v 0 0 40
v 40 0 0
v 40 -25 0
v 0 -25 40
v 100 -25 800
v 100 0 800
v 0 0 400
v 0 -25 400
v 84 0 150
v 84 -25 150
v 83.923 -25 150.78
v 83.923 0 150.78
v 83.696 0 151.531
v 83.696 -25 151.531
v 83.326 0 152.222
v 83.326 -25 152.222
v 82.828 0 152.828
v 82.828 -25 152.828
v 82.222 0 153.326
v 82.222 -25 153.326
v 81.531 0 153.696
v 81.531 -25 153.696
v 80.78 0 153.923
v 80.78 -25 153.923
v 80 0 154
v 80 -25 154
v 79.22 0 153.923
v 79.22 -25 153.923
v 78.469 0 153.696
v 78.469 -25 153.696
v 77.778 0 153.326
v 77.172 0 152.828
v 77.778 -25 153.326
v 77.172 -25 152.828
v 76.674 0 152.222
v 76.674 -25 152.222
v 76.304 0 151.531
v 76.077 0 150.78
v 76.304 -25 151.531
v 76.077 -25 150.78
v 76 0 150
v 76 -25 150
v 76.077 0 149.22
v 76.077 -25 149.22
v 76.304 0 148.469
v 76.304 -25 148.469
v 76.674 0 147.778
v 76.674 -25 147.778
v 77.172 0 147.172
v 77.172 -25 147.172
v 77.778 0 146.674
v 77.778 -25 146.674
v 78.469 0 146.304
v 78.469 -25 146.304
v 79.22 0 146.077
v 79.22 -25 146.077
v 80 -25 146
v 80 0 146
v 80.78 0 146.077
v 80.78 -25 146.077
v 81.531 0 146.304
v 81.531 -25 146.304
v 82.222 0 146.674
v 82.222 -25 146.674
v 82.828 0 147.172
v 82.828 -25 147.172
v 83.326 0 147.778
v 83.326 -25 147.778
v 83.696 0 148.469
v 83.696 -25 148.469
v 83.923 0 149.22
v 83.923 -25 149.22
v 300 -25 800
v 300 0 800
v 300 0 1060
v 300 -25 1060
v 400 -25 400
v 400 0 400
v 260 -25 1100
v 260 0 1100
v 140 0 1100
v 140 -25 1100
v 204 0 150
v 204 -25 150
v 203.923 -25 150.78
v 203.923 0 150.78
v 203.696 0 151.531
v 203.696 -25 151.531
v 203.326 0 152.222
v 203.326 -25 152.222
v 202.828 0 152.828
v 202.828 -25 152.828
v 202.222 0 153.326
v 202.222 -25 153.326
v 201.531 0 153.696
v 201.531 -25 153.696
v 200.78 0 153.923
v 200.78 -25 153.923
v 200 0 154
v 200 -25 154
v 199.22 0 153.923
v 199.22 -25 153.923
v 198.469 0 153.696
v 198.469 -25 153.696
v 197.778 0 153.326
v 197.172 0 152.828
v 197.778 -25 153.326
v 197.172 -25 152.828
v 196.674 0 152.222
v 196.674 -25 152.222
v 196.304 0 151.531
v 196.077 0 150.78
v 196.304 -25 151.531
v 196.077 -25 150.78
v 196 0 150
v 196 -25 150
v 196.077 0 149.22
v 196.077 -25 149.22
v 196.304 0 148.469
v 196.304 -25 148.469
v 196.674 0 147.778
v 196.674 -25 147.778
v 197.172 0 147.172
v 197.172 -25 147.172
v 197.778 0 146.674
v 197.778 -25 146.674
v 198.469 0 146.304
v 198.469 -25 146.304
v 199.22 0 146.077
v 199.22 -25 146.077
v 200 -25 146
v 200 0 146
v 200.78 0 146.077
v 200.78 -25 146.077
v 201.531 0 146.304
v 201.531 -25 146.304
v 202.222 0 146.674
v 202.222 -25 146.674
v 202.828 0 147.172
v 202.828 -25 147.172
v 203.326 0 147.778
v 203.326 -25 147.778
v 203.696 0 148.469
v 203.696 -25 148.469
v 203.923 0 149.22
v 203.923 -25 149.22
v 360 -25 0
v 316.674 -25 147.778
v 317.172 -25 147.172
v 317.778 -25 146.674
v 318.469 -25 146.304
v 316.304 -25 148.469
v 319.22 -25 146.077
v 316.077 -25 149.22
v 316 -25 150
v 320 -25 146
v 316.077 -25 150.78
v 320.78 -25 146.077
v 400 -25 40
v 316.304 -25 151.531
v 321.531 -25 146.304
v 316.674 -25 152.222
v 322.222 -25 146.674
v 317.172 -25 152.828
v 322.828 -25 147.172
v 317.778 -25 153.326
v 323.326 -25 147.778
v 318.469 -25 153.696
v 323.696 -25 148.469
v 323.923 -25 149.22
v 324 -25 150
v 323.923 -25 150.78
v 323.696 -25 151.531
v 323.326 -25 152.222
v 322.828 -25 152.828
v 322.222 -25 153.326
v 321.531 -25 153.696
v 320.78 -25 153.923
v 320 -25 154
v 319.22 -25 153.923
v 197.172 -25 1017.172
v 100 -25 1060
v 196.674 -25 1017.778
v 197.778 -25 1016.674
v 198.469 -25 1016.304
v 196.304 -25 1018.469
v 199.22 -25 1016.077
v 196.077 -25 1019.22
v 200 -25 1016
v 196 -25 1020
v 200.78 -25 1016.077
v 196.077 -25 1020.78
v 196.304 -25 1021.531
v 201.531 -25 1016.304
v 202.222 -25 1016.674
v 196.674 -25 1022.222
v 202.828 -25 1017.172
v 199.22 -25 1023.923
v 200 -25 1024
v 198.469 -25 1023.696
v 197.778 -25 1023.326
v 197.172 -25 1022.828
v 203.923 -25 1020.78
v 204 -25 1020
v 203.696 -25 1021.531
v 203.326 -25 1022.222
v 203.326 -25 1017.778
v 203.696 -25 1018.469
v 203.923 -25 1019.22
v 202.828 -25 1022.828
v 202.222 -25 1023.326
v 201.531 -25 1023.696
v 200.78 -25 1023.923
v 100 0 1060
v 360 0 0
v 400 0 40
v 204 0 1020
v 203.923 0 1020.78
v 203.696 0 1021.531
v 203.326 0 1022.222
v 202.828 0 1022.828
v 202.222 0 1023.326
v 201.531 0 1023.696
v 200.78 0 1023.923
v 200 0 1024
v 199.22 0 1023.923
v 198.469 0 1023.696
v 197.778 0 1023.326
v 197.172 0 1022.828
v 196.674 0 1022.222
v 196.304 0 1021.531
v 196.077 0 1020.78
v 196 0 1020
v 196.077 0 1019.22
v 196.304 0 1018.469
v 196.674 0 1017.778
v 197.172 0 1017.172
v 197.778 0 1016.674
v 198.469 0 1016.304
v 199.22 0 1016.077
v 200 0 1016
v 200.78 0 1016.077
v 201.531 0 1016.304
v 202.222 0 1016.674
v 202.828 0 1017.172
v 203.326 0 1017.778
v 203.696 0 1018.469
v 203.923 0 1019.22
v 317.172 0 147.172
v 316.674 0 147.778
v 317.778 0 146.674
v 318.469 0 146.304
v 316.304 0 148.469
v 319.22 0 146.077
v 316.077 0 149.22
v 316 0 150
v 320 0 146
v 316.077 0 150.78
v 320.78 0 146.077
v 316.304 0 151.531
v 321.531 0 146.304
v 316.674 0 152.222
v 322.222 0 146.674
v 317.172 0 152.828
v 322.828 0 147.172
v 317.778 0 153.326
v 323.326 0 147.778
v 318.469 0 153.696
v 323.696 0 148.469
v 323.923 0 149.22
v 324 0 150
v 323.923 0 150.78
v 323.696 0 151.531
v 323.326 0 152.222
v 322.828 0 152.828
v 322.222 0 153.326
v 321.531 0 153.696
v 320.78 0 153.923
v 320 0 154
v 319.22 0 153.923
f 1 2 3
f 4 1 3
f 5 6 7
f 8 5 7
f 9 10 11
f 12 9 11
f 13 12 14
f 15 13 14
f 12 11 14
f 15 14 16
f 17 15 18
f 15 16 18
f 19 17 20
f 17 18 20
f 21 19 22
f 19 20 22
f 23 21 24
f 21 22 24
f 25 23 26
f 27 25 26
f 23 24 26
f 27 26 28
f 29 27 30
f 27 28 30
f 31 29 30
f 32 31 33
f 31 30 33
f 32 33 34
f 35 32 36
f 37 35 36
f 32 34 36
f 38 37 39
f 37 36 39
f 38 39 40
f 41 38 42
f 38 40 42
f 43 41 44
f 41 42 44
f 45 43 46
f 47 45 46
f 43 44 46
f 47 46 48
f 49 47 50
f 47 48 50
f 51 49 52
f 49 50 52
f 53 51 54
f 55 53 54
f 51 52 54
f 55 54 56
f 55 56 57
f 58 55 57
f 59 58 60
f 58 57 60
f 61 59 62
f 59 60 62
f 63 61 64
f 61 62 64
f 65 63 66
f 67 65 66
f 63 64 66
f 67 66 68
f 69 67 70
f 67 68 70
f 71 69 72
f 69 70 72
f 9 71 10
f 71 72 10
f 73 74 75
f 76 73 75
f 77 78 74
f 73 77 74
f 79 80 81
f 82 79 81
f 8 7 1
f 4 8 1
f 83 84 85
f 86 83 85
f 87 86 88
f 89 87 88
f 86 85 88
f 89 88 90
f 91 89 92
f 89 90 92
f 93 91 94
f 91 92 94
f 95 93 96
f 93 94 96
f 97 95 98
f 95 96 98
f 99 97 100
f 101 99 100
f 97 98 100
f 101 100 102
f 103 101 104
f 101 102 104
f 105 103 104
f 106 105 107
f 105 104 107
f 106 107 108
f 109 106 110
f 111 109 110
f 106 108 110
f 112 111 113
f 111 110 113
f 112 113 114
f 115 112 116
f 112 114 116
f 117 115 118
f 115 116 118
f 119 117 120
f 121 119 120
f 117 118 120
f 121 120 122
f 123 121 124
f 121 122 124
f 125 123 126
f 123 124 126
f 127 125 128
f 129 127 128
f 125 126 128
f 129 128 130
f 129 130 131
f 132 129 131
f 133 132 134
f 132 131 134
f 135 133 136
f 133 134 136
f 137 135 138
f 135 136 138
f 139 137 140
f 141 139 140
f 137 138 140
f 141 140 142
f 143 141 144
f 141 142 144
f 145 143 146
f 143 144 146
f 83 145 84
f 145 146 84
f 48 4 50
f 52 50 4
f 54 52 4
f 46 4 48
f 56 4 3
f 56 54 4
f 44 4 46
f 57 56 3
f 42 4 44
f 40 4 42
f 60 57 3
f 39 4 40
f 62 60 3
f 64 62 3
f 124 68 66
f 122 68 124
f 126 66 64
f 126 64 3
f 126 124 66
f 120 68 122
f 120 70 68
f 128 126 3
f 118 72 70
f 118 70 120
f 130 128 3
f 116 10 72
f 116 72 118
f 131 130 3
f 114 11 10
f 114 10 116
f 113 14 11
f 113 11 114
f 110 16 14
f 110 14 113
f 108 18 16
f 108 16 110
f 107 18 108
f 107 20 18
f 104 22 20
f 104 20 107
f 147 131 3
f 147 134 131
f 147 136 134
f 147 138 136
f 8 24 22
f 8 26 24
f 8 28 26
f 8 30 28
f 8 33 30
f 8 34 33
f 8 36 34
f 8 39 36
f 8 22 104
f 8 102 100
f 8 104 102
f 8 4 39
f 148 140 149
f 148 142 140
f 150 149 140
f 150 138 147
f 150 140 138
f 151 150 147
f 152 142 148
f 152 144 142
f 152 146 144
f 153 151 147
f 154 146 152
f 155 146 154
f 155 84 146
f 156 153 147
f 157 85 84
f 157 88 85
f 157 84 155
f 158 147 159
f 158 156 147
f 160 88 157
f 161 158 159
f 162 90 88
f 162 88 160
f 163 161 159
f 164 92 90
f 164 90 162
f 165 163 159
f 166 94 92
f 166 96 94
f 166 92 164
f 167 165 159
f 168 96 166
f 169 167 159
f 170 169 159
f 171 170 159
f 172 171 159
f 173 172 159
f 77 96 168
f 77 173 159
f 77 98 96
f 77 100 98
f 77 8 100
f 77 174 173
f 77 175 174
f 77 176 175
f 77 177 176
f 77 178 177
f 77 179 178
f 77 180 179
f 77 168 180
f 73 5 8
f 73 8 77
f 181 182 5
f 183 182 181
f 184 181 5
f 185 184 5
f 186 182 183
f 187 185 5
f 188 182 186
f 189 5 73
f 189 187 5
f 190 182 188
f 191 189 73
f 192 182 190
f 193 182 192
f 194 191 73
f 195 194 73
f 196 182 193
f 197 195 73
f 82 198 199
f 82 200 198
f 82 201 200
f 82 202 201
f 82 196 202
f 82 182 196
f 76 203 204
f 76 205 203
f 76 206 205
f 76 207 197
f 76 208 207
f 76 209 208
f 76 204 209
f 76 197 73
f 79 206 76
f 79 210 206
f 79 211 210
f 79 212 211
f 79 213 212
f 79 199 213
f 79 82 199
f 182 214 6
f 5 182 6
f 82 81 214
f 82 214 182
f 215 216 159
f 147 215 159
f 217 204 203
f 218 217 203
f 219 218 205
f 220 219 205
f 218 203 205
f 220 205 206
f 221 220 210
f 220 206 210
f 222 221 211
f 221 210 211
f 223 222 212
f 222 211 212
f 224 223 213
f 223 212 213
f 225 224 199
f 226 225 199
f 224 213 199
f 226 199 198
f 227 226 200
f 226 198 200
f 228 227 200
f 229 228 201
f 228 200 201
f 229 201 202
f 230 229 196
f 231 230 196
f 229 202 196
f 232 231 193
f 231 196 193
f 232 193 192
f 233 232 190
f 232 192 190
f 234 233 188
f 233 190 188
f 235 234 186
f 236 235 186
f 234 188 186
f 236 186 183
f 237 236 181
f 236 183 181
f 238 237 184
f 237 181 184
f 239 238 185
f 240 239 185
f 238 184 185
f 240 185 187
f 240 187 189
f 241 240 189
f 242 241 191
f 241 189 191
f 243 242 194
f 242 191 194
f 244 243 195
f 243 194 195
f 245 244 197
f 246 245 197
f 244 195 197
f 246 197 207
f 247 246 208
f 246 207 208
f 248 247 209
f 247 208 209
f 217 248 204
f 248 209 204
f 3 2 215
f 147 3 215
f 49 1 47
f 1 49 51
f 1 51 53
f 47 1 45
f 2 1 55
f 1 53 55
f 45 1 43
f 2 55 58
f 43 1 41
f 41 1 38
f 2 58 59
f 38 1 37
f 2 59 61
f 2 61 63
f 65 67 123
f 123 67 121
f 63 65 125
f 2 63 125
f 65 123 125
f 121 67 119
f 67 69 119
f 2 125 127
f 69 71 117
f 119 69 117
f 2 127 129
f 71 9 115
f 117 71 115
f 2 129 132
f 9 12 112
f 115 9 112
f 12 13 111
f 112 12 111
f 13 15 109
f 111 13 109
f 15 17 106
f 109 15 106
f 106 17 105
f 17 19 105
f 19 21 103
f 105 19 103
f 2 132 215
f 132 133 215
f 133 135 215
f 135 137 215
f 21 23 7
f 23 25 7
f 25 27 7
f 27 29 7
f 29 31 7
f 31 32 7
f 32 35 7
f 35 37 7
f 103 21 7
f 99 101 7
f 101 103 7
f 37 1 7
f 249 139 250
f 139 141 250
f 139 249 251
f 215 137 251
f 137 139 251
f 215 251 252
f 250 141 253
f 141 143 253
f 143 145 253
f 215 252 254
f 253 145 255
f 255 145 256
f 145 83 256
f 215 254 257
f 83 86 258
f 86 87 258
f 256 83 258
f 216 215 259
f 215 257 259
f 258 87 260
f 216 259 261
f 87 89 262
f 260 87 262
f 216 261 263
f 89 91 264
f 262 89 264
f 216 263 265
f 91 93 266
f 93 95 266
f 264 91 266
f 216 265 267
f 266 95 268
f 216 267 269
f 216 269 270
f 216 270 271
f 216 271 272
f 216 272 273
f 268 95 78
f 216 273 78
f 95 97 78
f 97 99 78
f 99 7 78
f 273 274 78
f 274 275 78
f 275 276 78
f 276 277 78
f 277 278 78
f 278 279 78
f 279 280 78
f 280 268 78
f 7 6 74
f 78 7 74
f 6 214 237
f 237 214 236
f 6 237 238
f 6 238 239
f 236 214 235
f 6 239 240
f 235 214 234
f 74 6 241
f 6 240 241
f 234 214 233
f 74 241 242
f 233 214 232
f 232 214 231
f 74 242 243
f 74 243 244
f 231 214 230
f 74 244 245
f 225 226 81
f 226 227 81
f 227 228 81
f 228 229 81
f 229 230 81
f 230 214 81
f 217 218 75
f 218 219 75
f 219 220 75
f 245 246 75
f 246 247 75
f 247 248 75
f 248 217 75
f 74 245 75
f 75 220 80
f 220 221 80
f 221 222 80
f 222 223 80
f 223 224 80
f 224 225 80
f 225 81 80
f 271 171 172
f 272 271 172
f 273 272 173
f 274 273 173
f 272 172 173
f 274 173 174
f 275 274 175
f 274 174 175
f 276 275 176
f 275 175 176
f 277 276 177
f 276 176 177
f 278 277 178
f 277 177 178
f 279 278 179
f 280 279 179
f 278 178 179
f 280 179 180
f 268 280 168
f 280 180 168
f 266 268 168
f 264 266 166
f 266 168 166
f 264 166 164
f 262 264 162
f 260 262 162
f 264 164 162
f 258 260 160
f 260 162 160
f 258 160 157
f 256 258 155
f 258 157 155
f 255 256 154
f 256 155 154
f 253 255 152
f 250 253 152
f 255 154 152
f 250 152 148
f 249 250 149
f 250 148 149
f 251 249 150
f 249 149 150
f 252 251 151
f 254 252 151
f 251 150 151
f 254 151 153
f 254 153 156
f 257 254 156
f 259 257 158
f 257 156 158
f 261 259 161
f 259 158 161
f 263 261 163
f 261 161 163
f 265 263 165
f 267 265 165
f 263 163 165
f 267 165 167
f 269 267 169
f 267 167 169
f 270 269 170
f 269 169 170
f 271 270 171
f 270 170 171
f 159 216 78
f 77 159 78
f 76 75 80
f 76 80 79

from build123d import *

# Parameters (mm, degrees)
F1_DEPTH = 25
F2_R     = 4
F3_DEPTH = 25
F4_SIZE  = 40
F5_DEPTH = 25


with BuildPart() as f1:
    # F0 (on Front) → F1 (new body)
    with BuildSketch(Plane.XZ):
        Polygon((0, 400), (0, 0), (400, 0), (400, 400), (300, 800), (300, 1100), (100, 1100), (100, 800), align=None)
    extrude(amount=F1_DEPTH)

    # F2 (on face) → F3 (cut, through all)
    with BuildSketch(Plane.XZ.offset(25)):
        with Locations((80, 150)):
            Circle(F2_R)
        with Locations((320, 150)):
            Circle(F2_R)
        with Locations((200, 1020)):
            Circle(F2_R)
    extrude(amount=-F3_DEPTH, mode=Mode.SUBTRACT)

    # F4
    f4_edges = [f1.edges().sort_by_distance(p)[0] for p in [
        (400, -12.5, 0),
        (0, -12.5, 0),
        (300, -12.5, 1100),
        (100, -12.5, 1100),
    ]]
    chamfer(f4_edges, length=F4_SIZE)

    # F2 (on face) → F5 (cut)
    with BuildSketch(Plane.XZ.offset(25)):
        with Locations((200, 150)):
            Circle(F2_R)
    extrude(amount=-F5_DEPTH, mode=Mode.SUBTRACT)


solid = f1.part
